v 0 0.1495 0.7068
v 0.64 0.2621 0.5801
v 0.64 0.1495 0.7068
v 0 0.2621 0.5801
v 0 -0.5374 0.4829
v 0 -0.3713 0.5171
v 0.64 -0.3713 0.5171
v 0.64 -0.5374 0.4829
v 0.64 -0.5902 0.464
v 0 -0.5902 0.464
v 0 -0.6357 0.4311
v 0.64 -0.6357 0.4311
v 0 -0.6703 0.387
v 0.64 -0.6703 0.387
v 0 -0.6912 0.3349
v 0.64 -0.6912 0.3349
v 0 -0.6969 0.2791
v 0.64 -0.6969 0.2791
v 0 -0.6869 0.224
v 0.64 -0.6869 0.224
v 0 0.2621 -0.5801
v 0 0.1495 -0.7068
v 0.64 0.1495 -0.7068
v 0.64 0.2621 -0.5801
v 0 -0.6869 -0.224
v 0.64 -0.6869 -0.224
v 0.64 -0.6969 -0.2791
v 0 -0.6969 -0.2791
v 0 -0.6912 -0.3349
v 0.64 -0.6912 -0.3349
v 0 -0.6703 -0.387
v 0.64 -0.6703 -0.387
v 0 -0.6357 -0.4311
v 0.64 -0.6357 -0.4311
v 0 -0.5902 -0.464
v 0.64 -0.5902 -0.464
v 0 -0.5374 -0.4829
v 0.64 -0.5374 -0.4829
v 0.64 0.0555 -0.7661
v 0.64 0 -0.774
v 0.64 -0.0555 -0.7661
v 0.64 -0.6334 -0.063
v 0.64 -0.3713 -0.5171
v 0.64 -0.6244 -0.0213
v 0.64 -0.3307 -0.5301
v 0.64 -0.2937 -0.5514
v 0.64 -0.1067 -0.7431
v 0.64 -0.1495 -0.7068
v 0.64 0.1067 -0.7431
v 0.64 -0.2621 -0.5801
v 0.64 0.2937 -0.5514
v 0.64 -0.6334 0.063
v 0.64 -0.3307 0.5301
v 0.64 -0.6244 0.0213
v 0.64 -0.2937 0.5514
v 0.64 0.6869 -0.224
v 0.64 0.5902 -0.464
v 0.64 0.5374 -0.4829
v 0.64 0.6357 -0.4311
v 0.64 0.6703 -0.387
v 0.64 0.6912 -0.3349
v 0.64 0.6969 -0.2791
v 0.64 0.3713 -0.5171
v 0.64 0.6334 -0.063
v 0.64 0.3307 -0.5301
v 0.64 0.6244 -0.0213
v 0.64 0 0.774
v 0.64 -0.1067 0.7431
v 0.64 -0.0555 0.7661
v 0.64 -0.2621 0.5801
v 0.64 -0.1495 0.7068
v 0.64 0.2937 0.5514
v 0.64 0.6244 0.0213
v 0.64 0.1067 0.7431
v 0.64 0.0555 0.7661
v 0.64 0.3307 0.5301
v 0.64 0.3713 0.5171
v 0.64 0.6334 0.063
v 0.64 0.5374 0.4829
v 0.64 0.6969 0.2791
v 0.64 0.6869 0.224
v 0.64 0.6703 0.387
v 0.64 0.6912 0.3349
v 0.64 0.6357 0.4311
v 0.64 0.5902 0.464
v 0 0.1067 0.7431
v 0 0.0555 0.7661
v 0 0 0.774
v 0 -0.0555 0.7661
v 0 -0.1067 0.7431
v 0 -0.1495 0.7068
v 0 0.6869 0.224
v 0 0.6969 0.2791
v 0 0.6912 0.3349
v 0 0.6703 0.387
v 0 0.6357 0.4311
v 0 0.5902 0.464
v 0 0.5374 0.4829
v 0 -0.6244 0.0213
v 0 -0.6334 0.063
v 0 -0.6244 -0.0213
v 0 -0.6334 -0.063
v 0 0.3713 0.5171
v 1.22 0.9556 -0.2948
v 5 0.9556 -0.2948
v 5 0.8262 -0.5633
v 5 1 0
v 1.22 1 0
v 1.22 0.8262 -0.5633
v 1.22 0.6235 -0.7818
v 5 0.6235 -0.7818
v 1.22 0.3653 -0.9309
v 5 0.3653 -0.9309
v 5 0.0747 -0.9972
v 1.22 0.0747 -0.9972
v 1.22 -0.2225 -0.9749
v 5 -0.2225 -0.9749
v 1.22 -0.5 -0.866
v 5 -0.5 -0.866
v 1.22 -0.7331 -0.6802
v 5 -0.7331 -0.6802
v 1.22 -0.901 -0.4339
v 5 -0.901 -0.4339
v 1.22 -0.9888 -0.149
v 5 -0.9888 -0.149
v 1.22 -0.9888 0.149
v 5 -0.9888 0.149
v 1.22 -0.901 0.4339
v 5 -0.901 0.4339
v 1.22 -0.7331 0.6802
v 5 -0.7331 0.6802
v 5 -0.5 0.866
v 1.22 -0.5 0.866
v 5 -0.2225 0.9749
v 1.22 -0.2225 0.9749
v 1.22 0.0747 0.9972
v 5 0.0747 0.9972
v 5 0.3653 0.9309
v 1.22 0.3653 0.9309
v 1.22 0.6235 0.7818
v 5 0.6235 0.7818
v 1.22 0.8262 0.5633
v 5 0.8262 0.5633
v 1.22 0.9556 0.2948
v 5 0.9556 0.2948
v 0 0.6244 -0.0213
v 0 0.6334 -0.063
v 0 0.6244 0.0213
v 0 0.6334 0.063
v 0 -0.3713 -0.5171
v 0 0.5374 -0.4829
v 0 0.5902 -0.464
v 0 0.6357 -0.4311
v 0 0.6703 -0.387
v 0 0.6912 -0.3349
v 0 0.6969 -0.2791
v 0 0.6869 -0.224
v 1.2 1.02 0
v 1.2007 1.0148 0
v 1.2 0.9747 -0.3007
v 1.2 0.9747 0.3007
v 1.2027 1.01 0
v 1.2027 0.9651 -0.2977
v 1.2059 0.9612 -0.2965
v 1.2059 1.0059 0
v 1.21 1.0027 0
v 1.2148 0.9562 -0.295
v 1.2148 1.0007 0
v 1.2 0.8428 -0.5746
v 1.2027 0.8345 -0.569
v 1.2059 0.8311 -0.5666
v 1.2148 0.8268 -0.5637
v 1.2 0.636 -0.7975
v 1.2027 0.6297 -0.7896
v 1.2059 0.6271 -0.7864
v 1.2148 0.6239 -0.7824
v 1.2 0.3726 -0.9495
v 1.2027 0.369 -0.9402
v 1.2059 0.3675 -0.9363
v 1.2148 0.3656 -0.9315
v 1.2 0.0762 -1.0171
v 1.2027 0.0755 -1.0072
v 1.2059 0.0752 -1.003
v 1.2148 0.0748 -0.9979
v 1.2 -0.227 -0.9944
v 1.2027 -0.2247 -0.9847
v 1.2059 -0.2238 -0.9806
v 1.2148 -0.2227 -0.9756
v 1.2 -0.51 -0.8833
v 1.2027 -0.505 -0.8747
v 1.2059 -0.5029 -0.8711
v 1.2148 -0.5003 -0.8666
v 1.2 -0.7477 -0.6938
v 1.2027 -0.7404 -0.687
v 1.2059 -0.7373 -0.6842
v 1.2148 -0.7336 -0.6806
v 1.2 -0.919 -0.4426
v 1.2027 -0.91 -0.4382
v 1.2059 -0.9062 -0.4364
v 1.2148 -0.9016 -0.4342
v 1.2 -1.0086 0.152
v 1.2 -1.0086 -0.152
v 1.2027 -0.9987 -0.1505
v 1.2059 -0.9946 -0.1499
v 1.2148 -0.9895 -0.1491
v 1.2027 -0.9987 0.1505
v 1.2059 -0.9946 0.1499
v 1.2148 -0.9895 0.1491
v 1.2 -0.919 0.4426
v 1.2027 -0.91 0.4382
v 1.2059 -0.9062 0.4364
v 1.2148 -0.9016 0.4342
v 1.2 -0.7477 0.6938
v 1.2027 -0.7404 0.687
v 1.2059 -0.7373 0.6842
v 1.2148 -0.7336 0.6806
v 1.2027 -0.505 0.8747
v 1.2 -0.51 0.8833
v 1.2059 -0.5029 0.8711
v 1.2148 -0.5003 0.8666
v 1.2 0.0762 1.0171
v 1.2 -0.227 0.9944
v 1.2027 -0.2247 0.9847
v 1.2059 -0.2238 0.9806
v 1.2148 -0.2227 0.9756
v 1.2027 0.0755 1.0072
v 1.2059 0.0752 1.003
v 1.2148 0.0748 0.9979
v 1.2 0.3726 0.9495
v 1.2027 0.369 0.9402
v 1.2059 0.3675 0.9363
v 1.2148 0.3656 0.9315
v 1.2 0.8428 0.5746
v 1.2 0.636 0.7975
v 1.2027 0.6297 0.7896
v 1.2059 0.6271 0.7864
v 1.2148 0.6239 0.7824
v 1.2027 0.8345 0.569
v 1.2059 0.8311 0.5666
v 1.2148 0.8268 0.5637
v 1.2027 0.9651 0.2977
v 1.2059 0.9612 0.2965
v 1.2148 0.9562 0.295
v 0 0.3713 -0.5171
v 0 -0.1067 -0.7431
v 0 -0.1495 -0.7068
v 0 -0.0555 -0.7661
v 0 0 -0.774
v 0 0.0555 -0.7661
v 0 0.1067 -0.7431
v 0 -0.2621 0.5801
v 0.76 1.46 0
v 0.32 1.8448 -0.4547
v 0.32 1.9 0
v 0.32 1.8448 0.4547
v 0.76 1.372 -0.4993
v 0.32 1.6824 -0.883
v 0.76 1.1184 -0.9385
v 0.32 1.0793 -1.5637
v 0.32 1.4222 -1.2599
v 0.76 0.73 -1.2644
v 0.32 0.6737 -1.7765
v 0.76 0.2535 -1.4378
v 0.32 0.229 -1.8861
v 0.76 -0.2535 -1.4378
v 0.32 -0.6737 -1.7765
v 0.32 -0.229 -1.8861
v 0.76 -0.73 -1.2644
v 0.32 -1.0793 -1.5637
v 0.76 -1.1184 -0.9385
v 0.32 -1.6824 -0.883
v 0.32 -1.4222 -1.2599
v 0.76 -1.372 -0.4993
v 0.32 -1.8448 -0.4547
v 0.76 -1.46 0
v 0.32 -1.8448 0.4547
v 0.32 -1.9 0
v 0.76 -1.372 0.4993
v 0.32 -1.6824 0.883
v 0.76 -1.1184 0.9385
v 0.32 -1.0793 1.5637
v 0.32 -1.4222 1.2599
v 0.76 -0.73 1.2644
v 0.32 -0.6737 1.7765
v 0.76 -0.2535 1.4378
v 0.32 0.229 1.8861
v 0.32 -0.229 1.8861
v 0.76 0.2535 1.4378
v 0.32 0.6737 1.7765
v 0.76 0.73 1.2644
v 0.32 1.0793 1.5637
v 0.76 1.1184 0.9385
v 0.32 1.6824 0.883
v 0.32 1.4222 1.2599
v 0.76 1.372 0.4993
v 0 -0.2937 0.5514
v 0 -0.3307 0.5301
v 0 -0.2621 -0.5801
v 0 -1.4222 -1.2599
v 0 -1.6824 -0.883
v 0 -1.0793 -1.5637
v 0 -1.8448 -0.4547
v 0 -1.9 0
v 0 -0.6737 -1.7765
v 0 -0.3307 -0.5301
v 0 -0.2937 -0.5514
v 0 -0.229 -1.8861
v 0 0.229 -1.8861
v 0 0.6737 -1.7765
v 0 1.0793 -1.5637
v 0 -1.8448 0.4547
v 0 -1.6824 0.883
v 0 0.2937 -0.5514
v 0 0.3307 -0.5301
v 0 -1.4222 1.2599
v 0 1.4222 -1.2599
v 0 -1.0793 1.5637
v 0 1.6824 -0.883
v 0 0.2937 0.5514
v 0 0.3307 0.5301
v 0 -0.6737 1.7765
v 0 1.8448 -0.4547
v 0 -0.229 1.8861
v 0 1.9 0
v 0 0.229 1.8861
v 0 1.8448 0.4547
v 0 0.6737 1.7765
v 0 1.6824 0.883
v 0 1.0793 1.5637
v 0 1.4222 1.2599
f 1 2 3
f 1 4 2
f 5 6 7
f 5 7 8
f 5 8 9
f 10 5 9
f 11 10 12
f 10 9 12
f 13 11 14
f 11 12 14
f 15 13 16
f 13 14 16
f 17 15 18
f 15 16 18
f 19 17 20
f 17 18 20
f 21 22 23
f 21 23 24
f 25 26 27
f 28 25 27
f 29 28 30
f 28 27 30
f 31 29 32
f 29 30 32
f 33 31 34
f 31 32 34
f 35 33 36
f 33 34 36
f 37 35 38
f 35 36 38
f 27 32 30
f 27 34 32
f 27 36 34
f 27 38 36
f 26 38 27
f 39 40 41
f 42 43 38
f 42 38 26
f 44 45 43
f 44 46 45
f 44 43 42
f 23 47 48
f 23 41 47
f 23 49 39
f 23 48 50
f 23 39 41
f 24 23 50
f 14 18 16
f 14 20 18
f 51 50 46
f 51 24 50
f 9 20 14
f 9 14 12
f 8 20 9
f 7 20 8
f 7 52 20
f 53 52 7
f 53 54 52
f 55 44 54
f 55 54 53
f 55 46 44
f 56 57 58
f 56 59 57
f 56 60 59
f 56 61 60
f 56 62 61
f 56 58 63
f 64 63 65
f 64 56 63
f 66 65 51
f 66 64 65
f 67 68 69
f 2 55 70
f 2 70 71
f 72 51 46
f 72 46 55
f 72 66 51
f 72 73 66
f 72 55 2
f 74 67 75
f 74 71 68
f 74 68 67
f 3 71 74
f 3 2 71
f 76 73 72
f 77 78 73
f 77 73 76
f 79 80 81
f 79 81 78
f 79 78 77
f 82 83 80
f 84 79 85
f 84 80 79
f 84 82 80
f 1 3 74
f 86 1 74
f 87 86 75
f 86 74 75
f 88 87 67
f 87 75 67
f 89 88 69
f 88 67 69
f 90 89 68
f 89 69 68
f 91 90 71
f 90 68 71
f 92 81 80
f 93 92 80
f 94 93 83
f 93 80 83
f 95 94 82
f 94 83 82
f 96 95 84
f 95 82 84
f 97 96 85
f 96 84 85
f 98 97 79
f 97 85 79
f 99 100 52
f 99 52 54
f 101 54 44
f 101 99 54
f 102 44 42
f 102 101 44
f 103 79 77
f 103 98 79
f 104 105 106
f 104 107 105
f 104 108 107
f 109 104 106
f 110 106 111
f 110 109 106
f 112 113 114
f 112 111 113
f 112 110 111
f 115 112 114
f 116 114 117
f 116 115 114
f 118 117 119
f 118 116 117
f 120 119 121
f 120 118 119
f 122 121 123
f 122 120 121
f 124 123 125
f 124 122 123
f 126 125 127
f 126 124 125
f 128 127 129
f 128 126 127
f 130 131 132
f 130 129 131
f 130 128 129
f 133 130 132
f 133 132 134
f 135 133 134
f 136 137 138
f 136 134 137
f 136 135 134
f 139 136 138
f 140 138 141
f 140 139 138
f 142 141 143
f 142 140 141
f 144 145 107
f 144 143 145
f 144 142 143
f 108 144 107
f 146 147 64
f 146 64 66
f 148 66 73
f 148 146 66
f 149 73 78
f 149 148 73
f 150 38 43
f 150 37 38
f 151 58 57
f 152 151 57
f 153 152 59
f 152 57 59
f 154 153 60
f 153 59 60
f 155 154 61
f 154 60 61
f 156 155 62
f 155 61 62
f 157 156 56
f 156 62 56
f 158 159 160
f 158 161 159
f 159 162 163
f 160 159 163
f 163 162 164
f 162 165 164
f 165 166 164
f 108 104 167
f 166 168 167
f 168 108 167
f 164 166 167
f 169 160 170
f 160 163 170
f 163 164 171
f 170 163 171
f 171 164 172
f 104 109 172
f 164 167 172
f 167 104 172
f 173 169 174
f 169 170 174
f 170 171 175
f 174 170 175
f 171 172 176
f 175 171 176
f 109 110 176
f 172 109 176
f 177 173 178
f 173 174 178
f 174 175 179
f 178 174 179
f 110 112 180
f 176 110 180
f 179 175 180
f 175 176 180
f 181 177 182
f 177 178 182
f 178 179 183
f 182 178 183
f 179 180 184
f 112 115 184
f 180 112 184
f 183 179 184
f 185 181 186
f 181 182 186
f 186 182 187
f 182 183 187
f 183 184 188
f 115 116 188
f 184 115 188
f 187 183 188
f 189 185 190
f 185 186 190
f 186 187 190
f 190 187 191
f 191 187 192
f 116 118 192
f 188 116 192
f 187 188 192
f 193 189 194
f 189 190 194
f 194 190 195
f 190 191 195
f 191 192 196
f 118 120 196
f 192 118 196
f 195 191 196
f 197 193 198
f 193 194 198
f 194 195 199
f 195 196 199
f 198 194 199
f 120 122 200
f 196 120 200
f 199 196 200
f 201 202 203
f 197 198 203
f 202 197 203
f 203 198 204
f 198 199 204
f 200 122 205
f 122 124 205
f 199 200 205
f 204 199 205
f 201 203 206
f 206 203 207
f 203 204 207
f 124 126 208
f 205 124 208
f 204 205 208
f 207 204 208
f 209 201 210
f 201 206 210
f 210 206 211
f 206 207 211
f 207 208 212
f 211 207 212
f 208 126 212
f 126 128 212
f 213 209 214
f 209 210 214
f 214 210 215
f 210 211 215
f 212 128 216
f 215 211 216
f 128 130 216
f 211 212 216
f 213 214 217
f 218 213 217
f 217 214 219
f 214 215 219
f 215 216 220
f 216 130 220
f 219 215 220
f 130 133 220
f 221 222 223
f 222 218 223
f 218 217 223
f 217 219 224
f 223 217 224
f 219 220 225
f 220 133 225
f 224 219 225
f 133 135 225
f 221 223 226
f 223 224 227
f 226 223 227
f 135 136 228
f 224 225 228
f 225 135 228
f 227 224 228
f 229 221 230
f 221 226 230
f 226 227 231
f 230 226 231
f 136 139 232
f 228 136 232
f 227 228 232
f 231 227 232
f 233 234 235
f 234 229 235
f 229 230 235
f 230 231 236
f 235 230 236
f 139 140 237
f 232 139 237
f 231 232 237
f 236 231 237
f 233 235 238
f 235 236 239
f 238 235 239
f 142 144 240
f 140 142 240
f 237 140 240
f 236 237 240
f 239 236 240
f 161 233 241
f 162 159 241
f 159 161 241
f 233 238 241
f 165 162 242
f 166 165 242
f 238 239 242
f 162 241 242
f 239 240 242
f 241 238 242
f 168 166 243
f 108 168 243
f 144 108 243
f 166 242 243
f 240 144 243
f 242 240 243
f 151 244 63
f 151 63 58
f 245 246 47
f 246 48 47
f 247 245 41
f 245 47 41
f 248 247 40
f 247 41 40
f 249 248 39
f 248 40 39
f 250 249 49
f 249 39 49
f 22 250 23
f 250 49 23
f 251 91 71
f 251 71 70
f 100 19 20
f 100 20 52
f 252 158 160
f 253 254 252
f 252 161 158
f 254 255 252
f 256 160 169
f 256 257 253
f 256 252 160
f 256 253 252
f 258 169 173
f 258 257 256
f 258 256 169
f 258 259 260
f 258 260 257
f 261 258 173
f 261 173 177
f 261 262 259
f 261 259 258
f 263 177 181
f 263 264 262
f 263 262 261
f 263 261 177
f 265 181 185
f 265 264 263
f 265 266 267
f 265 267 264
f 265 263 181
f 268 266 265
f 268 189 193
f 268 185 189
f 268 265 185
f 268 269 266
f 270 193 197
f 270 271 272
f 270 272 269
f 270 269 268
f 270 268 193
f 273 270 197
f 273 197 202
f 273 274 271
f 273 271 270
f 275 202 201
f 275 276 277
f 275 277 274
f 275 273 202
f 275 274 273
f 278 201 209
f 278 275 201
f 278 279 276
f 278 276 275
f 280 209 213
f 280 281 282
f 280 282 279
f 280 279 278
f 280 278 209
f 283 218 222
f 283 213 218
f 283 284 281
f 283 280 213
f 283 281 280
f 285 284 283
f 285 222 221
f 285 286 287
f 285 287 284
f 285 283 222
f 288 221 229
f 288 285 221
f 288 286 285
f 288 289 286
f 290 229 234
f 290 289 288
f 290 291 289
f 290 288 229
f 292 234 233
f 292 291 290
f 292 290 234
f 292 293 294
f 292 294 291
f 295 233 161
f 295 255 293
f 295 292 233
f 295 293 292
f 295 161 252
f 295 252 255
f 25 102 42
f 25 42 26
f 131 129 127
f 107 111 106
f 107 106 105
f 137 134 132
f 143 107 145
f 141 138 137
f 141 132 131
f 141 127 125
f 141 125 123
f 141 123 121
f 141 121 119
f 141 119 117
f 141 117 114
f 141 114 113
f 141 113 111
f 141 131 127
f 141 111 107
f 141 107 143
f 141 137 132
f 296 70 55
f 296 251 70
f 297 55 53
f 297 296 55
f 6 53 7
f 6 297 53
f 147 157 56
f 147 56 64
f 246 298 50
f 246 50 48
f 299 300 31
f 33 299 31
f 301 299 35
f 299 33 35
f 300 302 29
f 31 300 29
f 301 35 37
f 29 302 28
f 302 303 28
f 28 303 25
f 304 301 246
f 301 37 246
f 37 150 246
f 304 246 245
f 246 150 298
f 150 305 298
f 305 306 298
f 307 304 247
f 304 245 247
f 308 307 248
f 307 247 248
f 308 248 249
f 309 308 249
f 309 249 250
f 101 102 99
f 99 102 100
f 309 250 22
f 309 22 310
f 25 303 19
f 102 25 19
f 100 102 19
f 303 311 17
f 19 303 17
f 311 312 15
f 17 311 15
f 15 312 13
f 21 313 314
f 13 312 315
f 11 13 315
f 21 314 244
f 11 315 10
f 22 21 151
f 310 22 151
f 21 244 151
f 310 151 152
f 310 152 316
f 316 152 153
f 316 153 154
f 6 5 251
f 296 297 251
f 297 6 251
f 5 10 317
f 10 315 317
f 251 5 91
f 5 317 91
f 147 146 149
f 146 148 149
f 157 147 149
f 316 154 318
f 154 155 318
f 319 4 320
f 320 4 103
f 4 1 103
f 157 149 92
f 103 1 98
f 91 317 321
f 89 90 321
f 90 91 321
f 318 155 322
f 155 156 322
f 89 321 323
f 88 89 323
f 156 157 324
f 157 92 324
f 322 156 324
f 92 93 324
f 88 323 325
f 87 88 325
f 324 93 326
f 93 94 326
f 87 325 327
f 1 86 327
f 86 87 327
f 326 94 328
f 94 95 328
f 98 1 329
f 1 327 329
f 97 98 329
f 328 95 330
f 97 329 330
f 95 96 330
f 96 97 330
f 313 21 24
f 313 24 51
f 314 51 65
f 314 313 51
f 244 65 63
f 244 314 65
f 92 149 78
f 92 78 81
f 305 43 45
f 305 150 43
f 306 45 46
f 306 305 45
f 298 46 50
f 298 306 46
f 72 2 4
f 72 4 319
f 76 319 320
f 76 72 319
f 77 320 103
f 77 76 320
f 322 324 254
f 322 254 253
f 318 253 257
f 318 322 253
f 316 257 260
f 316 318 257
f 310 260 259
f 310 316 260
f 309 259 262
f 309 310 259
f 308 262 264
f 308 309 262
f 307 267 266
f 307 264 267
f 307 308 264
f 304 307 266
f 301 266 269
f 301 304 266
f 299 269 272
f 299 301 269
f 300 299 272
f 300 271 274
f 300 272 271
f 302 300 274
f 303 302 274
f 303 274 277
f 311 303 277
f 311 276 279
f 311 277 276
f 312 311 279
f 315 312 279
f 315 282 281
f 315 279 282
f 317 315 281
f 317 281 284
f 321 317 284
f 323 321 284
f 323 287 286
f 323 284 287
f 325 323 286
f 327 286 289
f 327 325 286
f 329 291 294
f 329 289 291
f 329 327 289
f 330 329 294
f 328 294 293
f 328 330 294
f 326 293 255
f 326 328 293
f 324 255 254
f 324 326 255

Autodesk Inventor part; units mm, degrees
ref_plane "YZ Plane" through (0, 0, 0) normal (1, 0, 0) x (0, 1, 0)
ref_plane "XZ Plane" through (0, 0, 0) normal (0, 1, 0) x (-1, 0, 0)
ref_plane "XY Plane" through (0, 0, 0) normal (0, 0, 1) x (1, 0, 0)
sketch "Sketch1" plane through (0, 0, 0) normal (0, 0, 1) x (1, 0, 0)
  line L0 (0, 0) -> (5, 0)
  line L1 (5, 0) -> (5, 1)
  line L2 (5, 1) -> (1.8, 1)
  line L3 (1.8, 1) -> (1.6, 1)
  line L4 (1.6, 1) -> (1.22, 1)
  line L5 (1.2, 1.02) -> (1.2, 1.02)
  line L6 (1.2, 1.02) -> (0.32, 1.9)
  line L7 (0.32, 1.9) -> (0, 1.9)
  line L8 (0, 1.9) -> (0, 0)
  line L9 (1.2, 1.02) -> (1.2, 1.02)
  arc A0 (1.2, 1.02) -> (1.22, 1) centre (1.22, 1.02) ccw
  dimension "d17" = 5
  dimension "d18" = 0.32
  dimension "d19" = 1.2
  dimension "d20" = 0
  dimension "d21" = 3.8
  dimension "d22" = 2
  dimension "d23" = 2
  dimension "d25" = 45
  dimension "d26" = 0.2
  dimension "d28" = 0.02
  dimension "d29" = 3.2
  dimension "d30" = 0.02
  dimension "d52" = 0.6
revolve "Revolution1" add sketch "Sketch1" angle 360 about axis through (0, 0, 0) along (1, 0, 0)
thread "Thread1" size "M2x0.4" class "6g" standard "ISO Metric profile" length 3.2
sketch "Sketch2" plane through (0, 0, 0) normal (-1, 0, 0) x (0, 0, 1)
  circle A0 centre (0, 0) radius 0.875 construction
  circle A1 centre (0, 0) radius 0.6125 construction
  line L0 (0, 0) -> (0.5304, 0.3063)
  line L1 (0, 0) -> (0.6125, 0) construction
  line L2 (0, 0) -> (0.5304, -0.3063)
  line L3 (0, 0) -> (0.6125, 0) construction
  line L4 (0.5304, 0.3063) -> (0.875, 0)
  line L5 (0.875, 0) -> (0.5304, -0.3063)
  dimension "d34" = 1.75
  dimension "d35" = 1.225
  dimension "d39" = 30
  dimension "d40" = 330
extrude "Extrusion1" cut sketch "Sketch2" against normal blind 0.64
pattern_circular "Circular Pattern1" count 6 over 360 about axis through (-10, 0, 0) along (1, 0, 0) of "Extrusion1"
fillet "Fillet1" radius 0.2 12 edges at (0.32, 0.3063, 0.5304) (0.32, 0, 0.875) (0.32, -0.3063, 0.5304) (0.32, -0.6125, 0) (0.32, -0.7578, 0.4375) (0.32, -0.7578, -0.4375) (0.32, -0.3062, -0.5304) (0.32, 0, -0.875) (0.32, 0.3063, -0.5304) (0.32, 0.7578, -0.4375) (0.32, 0.6125, 0) (0.32, 0.7578, 0.4375)
equation "\"d32\" = b"
equation "\"d34\" = A_"
equation "\"d35\" = 0.7 * A_"
equation "\"d43\" = t"
equation "\"d48\" = v"
equation "\"d17\" = l_"
equation "\"d18\" = 0.5 * t"
equation "\"d19\" = k"
equation "\"d21\" = dk"
equation "\"d22\" = d"
equation "\"d23\" = ds_"
equation "\"d25\" = 0.5 * headAngle"
equation "\"d26\" = x"
equation "\"d28\" = r"
equation "\"d29\" = b"
equation "\"b\" = 3.2"
equation "\"A_\" = 1.75"
equation "\"t\" = 0.64"
equation "\"v\" = 0.2"
equation "\"l_\" = 5"
equation "\"k\" = 1.2"
equation "\"dk\" = 3.8"
equation "\"d\" = 2"
equation "\"ds_\" = 2"
equation "\"headAngle\" = 90deg"
equation "\"x\" = 0.2"
equation "\"r\" = 0.02"
properties part number "Senkkopfschraube mit Innenrund ISO 14581 - M2x5-8.8" material "Stahl"
